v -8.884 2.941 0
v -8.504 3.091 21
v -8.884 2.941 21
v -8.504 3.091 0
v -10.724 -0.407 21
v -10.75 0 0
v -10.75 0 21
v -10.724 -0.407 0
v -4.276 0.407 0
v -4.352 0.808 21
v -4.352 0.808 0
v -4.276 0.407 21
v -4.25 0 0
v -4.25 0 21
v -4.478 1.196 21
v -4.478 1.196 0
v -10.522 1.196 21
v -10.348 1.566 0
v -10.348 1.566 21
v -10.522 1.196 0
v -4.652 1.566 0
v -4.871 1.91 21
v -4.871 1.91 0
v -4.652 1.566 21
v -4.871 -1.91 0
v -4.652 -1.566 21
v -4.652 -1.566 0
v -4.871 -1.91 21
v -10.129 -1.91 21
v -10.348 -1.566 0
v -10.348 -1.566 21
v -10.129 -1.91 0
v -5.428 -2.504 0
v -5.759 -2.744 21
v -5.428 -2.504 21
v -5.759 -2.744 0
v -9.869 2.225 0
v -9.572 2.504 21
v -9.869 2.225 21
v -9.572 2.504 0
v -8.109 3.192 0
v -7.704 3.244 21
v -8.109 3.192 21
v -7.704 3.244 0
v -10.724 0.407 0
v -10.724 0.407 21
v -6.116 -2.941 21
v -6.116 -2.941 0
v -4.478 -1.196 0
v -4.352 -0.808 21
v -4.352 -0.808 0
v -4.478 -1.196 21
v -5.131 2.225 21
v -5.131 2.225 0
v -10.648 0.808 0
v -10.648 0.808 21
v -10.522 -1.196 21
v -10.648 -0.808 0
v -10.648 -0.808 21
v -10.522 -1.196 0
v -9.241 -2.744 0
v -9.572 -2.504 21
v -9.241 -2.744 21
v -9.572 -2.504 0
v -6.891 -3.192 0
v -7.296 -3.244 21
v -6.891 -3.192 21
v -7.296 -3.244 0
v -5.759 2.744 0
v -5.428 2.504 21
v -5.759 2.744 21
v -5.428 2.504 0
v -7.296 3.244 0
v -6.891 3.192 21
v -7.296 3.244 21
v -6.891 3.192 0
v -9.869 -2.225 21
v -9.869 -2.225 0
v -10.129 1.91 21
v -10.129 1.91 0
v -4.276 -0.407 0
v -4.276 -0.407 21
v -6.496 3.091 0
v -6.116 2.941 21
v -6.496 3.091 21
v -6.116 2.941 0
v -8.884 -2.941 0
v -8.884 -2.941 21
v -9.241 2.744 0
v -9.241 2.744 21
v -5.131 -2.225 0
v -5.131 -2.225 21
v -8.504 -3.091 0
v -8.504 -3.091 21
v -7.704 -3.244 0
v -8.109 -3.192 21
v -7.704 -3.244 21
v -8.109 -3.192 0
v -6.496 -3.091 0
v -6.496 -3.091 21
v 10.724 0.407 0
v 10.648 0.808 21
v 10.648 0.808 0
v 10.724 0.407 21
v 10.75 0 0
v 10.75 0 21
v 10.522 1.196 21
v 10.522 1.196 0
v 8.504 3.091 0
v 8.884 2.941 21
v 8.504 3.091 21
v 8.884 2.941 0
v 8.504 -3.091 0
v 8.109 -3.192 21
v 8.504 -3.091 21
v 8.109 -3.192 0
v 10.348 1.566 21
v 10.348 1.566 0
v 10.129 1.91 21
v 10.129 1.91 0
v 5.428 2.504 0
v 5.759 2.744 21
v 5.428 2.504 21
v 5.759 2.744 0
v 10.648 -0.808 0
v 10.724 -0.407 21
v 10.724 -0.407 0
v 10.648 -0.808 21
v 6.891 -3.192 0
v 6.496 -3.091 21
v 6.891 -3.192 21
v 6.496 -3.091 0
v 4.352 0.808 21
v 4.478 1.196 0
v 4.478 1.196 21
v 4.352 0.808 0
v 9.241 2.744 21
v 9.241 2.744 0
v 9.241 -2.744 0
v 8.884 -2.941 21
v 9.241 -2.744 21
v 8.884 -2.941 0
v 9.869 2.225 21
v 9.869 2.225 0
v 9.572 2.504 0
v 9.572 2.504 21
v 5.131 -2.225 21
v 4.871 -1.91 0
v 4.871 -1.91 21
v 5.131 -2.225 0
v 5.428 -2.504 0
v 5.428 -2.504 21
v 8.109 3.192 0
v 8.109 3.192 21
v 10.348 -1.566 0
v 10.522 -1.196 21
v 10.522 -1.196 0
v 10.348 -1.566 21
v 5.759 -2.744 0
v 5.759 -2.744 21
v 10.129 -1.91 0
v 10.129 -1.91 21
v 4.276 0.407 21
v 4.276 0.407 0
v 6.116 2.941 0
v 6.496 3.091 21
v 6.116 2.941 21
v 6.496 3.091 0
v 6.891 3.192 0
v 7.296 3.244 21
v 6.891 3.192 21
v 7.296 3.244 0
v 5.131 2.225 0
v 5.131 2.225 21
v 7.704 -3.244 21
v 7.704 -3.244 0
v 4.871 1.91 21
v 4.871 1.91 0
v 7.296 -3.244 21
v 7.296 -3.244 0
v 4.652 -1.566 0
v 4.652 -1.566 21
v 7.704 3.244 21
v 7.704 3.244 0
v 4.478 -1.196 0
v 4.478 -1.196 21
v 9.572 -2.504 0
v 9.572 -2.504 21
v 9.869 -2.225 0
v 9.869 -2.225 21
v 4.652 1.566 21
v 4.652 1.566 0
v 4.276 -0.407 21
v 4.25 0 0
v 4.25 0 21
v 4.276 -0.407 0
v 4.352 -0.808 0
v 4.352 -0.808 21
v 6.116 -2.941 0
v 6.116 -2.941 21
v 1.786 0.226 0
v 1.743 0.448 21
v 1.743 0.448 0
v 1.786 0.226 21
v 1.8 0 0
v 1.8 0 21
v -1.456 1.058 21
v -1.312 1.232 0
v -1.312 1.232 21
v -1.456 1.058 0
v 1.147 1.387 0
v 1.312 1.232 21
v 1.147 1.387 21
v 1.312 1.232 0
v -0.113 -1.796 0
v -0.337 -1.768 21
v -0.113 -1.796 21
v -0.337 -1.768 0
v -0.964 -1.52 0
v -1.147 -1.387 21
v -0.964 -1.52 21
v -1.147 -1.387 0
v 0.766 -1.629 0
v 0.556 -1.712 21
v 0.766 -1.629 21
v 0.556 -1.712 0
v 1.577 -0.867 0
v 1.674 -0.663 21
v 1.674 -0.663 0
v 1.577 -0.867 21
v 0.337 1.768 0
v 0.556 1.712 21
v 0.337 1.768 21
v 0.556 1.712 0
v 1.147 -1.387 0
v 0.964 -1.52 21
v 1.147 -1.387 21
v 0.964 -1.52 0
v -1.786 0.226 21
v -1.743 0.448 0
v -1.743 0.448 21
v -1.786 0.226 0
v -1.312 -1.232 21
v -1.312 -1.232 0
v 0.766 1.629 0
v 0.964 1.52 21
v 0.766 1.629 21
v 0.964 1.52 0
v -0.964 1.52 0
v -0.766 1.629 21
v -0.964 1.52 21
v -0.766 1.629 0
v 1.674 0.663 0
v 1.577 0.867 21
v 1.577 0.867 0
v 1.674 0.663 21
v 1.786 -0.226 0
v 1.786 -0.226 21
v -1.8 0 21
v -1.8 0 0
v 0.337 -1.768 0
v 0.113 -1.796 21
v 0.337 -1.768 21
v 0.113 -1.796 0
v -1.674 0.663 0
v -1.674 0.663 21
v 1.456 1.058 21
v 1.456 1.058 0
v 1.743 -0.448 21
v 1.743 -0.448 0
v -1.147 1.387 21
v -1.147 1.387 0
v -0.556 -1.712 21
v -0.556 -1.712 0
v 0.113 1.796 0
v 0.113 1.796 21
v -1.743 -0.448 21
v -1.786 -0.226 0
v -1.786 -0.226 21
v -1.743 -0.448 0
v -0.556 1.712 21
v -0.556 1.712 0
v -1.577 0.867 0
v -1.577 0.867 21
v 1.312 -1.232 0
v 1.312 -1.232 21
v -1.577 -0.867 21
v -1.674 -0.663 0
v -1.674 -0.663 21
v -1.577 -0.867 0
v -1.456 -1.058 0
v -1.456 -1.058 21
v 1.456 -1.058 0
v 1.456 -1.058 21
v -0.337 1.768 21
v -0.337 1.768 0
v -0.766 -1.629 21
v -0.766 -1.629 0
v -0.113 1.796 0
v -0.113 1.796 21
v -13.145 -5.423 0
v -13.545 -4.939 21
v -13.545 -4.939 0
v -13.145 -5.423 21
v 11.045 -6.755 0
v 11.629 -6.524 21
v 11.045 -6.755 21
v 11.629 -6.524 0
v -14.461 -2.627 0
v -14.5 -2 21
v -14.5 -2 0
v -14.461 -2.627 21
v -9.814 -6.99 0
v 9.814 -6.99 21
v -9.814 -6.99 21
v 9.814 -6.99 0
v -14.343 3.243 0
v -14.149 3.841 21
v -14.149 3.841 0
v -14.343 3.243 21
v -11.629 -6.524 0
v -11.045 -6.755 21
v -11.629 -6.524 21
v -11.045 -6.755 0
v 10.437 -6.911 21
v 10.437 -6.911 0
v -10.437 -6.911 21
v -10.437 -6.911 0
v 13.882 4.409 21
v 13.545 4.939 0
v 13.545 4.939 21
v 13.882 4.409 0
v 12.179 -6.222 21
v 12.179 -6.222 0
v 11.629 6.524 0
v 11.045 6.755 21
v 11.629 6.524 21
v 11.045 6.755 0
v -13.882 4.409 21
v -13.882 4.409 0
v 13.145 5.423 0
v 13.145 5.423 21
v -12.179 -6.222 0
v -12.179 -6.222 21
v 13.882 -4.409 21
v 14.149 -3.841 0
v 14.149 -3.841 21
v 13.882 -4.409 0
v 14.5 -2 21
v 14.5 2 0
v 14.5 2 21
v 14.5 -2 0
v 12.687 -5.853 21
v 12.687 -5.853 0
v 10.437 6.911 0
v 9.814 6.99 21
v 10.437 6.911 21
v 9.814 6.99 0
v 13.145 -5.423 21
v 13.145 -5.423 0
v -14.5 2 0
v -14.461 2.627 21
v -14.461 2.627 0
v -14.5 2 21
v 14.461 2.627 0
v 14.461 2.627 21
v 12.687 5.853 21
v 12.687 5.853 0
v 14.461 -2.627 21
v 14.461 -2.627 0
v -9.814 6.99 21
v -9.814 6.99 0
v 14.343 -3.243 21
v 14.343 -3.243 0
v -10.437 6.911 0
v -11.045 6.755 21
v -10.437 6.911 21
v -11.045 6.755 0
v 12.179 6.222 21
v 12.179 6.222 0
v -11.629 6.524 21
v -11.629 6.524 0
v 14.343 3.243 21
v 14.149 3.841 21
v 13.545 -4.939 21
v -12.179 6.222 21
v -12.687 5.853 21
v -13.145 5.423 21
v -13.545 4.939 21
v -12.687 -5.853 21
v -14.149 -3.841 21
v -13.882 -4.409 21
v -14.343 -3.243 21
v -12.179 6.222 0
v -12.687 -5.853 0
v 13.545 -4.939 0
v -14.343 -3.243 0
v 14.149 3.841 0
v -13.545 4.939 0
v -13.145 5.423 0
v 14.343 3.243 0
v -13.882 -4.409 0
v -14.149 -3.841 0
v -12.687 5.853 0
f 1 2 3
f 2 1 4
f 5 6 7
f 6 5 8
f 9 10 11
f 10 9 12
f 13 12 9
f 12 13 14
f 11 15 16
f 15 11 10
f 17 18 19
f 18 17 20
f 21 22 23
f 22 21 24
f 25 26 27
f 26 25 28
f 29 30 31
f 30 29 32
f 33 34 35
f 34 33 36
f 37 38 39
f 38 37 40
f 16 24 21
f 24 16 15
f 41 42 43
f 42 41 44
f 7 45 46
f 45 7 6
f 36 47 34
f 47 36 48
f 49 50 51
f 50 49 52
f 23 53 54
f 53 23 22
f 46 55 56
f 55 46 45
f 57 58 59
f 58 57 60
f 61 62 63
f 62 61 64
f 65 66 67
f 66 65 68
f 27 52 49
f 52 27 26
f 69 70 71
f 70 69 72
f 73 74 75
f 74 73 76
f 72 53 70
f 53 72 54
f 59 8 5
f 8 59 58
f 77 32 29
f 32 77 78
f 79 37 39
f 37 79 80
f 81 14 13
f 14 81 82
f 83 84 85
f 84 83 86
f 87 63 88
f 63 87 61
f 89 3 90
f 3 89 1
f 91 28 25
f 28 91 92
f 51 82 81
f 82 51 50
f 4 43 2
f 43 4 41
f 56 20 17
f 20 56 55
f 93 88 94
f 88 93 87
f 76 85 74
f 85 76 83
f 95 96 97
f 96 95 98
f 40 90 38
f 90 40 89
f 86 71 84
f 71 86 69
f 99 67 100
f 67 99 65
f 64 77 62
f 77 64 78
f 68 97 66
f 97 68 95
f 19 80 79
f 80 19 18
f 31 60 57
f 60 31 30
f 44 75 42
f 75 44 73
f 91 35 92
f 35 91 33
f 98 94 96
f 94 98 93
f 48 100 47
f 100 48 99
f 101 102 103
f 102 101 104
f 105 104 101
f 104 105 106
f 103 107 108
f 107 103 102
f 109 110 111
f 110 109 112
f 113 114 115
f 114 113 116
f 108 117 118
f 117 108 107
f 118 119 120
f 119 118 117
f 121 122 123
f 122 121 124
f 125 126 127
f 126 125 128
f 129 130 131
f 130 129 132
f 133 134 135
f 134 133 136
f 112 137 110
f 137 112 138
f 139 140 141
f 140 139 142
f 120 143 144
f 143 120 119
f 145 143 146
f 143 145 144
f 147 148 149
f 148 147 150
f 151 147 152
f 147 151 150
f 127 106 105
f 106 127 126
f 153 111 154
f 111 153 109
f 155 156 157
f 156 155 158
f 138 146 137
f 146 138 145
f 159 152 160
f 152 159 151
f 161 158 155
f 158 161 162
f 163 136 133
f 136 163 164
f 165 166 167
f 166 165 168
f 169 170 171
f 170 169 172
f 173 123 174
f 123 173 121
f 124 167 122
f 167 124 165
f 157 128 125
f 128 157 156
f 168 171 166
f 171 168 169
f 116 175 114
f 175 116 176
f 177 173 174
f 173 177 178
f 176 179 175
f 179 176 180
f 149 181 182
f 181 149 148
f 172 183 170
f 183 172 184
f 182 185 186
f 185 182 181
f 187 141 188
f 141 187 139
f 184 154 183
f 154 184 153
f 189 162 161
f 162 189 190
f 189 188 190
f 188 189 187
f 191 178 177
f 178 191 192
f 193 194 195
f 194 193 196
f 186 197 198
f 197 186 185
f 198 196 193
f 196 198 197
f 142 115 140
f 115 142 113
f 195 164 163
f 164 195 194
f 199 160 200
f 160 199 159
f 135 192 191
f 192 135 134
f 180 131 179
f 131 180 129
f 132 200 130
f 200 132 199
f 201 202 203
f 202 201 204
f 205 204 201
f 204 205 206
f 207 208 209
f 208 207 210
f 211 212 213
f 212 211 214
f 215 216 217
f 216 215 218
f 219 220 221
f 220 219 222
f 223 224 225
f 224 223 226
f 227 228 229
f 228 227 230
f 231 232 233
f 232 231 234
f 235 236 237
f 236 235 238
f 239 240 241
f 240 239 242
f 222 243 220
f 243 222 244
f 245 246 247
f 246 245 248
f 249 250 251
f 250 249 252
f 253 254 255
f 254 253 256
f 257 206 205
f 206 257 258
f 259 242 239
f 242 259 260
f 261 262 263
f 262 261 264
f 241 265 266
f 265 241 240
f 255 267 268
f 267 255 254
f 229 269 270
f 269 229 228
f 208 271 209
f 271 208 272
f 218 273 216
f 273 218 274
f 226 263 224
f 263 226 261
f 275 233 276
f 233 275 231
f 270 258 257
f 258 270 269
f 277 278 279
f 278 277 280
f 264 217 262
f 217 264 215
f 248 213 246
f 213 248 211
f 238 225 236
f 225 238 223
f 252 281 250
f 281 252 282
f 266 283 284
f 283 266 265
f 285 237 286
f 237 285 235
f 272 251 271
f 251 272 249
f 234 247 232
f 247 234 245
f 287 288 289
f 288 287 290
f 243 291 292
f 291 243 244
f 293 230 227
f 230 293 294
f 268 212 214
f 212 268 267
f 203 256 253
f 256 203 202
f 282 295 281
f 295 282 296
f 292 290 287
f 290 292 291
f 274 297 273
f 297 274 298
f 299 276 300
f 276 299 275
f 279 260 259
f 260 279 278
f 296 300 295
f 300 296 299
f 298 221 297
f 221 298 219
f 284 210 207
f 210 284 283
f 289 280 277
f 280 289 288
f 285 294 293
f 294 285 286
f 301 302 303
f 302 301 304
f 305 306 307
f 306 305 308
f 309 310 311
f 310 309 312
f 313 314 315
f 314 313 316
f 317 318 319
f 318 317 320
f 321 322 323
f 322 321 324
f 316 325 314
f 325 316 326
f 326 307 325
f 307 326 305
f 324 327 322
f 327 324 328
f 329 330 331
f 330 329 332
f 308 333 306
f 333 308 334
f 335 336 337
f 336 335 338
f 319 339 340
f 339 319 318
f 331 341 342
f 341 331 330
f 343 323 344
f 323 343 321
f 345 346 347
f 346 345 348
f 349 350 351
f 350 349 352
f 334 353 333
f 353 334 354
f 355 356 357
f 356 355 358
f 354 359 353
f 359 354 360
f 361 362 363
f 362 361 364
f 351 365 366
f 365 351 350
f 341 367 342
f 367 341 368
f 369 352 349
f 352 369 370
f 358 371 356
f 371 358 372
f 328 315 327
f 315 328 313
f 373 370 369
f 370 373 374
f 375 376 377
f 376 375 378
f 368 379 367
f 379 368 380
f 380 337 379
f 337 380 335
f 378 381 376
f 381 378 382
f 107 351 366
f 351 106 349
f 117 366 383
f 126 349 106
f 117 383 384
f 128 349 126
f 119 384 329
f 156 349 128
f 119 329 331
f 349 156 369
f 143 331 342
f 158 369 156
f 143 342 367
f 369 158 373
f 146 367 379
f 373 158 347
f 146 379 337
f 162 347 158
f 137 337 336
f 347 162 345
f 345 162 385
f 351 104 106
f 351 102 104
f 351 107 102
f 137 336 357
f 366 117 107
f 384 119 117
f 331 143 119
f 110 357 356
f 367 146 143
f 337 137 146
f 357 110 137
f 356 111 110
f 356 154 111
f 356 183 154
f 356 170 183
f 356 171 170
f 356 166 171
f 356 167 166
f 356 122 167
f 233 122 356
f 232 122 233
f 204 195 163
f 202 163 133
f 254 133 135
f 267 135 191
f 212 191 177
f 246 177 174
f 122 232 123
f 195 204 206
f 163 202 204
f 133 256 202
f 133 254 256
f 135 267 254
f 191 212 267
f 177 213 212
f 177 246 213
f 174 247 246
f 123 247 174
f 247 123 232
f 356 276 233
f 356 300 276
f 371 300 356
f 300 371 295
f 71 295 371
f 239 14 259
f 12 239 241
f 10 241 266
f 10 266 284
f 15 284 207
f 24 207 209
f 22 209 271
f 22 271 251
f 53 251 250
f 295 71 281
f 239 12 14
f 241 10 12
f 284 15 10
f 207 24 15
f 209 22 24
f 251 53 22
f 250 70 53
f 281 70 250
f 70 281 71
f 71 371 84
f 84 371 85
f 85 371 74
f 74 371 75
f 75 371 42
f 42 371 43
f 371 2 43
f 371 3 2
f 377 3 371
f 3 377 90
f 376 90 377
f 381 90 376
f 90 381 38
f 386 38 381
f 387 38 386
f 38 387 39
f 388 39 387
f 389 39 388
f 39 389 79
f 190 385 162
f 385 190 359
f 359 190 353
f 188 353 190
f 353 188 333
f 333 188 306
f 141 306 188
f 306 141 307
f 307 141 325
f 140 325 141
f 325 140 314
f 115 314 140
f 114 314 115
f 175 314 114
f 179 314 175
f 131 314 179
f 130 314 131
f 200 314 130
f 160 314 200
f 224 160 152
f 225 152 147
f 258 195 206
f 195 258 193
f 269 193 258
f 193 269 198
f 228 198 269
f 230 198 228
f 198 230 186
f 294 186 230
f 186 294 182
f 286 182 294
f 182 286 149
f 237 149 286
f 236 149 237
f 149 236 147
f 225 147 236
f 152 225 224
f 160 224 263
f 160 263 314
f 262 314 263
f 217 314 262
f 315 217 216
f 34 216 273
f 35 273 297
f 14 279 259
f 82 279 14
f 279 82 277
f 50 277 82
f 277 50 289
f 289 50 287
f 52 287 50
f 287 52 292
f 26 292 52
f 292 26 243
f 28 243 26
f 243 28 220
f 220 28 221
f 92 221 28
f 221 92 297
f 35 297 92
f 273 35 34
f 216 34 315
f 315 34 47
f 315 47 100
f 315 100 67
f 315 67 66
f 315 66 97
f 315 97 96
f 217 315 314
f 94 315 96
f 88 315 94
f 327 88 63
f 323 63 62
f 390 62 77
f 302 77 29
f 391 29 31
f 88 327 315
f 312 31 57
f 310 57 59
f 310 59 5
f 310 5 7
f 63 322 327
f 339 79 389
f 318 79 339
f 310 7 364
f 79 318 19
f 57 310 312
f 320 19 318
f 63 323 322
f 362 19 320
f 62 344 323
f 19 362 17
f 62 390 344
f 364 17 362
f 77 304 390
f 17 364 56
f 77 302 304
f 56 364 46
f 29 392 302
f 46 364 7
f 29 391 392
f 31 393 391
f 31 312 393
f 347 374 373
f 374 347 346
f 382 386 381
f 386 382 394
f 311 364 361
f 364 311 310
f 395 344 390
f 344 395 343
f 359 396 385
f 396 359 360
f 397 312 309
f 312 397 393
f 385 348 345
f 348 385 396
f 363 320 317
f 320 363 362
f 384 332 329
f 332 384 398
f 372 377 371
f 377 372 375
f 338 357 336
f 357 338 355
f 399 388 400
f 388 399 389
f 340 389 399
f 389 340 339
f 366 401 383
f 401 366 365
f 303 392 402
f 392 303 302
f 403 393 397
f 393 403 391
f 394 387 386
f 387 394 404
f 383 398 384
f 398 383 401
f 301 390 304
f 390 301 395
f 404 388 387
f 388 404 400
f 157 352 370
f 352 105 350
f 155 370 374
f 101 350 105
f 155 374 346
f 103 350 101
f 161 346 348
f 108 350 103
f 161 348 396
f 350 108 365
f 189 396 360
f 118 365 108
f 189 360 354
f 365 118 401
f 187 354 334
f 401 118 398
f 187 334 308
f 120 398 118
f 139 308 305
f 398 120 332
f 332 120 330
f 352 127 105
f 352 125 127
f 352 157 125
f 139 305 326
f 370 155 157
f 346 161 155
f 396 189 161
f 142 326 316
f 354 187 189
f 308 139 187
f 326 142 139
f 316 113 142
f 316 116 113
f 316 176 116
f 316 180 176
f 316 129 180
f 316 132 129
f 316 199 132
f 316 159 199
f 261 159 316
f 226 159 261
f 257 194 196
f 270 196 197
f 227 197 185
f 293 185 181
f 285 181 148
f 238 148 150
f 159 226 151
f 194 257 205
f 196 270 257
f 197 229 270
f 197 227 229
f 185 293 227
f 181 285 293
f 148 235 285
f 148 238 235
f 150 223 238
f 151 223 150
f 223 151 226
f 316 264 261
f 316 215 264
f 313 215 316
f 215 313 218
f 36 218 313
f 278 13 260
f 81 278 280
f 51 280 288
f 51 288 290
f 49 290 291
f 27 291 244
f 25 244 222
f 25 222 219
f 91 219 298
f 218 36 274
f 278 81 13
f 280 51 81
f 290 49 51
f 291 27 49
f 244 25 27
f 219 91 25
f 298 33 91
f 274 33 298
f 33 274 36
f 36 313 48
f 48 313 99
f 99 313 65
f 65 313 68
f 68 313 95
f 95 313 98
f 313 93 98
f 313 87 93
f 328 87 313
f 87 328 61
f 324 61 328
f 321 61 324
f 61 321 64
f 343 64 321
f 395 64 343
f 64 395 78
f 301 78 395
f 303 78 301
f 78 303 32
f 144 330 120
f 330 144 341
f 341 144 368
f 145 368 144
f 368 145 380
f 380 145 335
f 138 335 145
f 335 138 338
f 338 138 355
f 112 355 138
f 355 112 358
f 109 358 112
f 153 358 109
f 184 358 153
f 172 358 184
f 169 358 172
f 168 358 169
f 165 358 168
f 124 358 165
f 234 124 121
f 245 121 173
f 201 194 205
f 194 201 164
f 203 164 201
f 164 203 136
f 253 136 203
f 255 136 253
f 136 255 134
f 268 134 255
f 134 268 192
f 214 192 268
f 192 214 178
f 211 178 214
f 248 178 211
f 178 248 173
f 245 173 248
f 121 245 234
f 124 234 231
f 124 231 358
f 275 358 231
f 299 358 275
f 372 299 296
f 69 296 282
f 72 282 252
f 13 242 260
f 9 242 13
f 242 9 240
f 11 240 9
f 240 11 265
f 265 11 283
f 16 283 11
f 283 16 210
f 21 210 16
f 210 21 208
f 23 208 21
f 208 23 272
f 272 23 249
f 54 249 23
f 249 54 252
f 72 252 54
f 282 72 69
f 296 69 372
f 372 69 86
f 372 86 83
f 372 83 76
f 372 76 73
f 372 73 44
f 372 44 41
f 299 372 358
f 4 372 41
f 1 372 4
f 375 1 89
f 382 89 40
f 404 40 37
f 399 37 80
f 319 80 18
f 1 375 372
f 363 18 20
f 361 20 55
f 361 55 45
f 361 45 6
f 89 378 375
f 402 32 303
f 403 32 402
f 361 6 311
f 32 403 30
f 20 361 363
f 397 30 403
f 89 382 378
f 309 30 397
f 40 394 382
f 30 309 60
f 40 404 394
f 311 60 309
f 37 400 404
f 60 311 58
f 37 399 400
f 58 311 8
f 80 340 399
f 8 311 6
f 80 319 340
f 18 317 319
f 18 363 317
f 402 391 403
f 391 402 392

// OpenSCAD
$fn = 50;


difference() {
	union() {
		*color(alpha = 1.0000000000, c = "gray") {
			translate(v = [0, 7, 0]) {
				linear_extrude(height = 1) {
					text(font = "Arial:style=Bold", halign = "center", size = 4.5000000000, text = "COMMENT plate main", valign = "center");
				}
			}
		}
		hull() {
			translate(v = [-9.5000000000, 2.0000000000, 0]) {
				cylinder(h = 21, r = 5);
			}
			translate(v = [9.5000000000, 2.0000000000, 0]) {
				cylinder(h = 21, r = 5);
			}
			translate(v = [-9.5000000000, -2.0000000000, 0]) {
				cylinder(h = 21, r = 5);
			}
			translate(v = [9.5000000000, -2.0000000000, 0]) {
				cylinder(h = 21, r = 5);
			}
		}
	}
	union() {
		*color(alpha = 1.0000000000, c = "gray") {
			translate(v = [0, 7, 0]) {
				linear_extrude(height = 1) {
					text(font = "Arial:style=Bold", halign = "center", size = 4.5000000000, text = "COMMENT holes main", valign = "center");
				}
			}
		}
		translate(v = [-7.5000000000, 0.0000000000, 0]) {
			translate(v = [0, 0, -100]) {
				cylinder(h = 200, r = 3.2500000000);
			}
		}
		translate(v = [7.5000000000, 0.0000000000, 0]) {
			translate(v = [0, 0, -100]) {
				cylinder(h = 200, r = 3.2500000000);
			}
		}
		translate(v = [-7.5000000000, 0.0000000000, 0]) {
			translate(v = [0, 0, -100]) {
				cylinder(h = 200, r = 1.8000000000);
			}
		}
		translate(v = [0, 0, -100]) {
			cylinder(h = 200, r = 1.8000000000);
		}
		translate(v = [7.5000000000, 0.0000000000, 0]) {
			translate(v = [0, 0, -100]) {
				cylinder(h = 200, r = 1.8000000000);
			}
		}
	}
}
